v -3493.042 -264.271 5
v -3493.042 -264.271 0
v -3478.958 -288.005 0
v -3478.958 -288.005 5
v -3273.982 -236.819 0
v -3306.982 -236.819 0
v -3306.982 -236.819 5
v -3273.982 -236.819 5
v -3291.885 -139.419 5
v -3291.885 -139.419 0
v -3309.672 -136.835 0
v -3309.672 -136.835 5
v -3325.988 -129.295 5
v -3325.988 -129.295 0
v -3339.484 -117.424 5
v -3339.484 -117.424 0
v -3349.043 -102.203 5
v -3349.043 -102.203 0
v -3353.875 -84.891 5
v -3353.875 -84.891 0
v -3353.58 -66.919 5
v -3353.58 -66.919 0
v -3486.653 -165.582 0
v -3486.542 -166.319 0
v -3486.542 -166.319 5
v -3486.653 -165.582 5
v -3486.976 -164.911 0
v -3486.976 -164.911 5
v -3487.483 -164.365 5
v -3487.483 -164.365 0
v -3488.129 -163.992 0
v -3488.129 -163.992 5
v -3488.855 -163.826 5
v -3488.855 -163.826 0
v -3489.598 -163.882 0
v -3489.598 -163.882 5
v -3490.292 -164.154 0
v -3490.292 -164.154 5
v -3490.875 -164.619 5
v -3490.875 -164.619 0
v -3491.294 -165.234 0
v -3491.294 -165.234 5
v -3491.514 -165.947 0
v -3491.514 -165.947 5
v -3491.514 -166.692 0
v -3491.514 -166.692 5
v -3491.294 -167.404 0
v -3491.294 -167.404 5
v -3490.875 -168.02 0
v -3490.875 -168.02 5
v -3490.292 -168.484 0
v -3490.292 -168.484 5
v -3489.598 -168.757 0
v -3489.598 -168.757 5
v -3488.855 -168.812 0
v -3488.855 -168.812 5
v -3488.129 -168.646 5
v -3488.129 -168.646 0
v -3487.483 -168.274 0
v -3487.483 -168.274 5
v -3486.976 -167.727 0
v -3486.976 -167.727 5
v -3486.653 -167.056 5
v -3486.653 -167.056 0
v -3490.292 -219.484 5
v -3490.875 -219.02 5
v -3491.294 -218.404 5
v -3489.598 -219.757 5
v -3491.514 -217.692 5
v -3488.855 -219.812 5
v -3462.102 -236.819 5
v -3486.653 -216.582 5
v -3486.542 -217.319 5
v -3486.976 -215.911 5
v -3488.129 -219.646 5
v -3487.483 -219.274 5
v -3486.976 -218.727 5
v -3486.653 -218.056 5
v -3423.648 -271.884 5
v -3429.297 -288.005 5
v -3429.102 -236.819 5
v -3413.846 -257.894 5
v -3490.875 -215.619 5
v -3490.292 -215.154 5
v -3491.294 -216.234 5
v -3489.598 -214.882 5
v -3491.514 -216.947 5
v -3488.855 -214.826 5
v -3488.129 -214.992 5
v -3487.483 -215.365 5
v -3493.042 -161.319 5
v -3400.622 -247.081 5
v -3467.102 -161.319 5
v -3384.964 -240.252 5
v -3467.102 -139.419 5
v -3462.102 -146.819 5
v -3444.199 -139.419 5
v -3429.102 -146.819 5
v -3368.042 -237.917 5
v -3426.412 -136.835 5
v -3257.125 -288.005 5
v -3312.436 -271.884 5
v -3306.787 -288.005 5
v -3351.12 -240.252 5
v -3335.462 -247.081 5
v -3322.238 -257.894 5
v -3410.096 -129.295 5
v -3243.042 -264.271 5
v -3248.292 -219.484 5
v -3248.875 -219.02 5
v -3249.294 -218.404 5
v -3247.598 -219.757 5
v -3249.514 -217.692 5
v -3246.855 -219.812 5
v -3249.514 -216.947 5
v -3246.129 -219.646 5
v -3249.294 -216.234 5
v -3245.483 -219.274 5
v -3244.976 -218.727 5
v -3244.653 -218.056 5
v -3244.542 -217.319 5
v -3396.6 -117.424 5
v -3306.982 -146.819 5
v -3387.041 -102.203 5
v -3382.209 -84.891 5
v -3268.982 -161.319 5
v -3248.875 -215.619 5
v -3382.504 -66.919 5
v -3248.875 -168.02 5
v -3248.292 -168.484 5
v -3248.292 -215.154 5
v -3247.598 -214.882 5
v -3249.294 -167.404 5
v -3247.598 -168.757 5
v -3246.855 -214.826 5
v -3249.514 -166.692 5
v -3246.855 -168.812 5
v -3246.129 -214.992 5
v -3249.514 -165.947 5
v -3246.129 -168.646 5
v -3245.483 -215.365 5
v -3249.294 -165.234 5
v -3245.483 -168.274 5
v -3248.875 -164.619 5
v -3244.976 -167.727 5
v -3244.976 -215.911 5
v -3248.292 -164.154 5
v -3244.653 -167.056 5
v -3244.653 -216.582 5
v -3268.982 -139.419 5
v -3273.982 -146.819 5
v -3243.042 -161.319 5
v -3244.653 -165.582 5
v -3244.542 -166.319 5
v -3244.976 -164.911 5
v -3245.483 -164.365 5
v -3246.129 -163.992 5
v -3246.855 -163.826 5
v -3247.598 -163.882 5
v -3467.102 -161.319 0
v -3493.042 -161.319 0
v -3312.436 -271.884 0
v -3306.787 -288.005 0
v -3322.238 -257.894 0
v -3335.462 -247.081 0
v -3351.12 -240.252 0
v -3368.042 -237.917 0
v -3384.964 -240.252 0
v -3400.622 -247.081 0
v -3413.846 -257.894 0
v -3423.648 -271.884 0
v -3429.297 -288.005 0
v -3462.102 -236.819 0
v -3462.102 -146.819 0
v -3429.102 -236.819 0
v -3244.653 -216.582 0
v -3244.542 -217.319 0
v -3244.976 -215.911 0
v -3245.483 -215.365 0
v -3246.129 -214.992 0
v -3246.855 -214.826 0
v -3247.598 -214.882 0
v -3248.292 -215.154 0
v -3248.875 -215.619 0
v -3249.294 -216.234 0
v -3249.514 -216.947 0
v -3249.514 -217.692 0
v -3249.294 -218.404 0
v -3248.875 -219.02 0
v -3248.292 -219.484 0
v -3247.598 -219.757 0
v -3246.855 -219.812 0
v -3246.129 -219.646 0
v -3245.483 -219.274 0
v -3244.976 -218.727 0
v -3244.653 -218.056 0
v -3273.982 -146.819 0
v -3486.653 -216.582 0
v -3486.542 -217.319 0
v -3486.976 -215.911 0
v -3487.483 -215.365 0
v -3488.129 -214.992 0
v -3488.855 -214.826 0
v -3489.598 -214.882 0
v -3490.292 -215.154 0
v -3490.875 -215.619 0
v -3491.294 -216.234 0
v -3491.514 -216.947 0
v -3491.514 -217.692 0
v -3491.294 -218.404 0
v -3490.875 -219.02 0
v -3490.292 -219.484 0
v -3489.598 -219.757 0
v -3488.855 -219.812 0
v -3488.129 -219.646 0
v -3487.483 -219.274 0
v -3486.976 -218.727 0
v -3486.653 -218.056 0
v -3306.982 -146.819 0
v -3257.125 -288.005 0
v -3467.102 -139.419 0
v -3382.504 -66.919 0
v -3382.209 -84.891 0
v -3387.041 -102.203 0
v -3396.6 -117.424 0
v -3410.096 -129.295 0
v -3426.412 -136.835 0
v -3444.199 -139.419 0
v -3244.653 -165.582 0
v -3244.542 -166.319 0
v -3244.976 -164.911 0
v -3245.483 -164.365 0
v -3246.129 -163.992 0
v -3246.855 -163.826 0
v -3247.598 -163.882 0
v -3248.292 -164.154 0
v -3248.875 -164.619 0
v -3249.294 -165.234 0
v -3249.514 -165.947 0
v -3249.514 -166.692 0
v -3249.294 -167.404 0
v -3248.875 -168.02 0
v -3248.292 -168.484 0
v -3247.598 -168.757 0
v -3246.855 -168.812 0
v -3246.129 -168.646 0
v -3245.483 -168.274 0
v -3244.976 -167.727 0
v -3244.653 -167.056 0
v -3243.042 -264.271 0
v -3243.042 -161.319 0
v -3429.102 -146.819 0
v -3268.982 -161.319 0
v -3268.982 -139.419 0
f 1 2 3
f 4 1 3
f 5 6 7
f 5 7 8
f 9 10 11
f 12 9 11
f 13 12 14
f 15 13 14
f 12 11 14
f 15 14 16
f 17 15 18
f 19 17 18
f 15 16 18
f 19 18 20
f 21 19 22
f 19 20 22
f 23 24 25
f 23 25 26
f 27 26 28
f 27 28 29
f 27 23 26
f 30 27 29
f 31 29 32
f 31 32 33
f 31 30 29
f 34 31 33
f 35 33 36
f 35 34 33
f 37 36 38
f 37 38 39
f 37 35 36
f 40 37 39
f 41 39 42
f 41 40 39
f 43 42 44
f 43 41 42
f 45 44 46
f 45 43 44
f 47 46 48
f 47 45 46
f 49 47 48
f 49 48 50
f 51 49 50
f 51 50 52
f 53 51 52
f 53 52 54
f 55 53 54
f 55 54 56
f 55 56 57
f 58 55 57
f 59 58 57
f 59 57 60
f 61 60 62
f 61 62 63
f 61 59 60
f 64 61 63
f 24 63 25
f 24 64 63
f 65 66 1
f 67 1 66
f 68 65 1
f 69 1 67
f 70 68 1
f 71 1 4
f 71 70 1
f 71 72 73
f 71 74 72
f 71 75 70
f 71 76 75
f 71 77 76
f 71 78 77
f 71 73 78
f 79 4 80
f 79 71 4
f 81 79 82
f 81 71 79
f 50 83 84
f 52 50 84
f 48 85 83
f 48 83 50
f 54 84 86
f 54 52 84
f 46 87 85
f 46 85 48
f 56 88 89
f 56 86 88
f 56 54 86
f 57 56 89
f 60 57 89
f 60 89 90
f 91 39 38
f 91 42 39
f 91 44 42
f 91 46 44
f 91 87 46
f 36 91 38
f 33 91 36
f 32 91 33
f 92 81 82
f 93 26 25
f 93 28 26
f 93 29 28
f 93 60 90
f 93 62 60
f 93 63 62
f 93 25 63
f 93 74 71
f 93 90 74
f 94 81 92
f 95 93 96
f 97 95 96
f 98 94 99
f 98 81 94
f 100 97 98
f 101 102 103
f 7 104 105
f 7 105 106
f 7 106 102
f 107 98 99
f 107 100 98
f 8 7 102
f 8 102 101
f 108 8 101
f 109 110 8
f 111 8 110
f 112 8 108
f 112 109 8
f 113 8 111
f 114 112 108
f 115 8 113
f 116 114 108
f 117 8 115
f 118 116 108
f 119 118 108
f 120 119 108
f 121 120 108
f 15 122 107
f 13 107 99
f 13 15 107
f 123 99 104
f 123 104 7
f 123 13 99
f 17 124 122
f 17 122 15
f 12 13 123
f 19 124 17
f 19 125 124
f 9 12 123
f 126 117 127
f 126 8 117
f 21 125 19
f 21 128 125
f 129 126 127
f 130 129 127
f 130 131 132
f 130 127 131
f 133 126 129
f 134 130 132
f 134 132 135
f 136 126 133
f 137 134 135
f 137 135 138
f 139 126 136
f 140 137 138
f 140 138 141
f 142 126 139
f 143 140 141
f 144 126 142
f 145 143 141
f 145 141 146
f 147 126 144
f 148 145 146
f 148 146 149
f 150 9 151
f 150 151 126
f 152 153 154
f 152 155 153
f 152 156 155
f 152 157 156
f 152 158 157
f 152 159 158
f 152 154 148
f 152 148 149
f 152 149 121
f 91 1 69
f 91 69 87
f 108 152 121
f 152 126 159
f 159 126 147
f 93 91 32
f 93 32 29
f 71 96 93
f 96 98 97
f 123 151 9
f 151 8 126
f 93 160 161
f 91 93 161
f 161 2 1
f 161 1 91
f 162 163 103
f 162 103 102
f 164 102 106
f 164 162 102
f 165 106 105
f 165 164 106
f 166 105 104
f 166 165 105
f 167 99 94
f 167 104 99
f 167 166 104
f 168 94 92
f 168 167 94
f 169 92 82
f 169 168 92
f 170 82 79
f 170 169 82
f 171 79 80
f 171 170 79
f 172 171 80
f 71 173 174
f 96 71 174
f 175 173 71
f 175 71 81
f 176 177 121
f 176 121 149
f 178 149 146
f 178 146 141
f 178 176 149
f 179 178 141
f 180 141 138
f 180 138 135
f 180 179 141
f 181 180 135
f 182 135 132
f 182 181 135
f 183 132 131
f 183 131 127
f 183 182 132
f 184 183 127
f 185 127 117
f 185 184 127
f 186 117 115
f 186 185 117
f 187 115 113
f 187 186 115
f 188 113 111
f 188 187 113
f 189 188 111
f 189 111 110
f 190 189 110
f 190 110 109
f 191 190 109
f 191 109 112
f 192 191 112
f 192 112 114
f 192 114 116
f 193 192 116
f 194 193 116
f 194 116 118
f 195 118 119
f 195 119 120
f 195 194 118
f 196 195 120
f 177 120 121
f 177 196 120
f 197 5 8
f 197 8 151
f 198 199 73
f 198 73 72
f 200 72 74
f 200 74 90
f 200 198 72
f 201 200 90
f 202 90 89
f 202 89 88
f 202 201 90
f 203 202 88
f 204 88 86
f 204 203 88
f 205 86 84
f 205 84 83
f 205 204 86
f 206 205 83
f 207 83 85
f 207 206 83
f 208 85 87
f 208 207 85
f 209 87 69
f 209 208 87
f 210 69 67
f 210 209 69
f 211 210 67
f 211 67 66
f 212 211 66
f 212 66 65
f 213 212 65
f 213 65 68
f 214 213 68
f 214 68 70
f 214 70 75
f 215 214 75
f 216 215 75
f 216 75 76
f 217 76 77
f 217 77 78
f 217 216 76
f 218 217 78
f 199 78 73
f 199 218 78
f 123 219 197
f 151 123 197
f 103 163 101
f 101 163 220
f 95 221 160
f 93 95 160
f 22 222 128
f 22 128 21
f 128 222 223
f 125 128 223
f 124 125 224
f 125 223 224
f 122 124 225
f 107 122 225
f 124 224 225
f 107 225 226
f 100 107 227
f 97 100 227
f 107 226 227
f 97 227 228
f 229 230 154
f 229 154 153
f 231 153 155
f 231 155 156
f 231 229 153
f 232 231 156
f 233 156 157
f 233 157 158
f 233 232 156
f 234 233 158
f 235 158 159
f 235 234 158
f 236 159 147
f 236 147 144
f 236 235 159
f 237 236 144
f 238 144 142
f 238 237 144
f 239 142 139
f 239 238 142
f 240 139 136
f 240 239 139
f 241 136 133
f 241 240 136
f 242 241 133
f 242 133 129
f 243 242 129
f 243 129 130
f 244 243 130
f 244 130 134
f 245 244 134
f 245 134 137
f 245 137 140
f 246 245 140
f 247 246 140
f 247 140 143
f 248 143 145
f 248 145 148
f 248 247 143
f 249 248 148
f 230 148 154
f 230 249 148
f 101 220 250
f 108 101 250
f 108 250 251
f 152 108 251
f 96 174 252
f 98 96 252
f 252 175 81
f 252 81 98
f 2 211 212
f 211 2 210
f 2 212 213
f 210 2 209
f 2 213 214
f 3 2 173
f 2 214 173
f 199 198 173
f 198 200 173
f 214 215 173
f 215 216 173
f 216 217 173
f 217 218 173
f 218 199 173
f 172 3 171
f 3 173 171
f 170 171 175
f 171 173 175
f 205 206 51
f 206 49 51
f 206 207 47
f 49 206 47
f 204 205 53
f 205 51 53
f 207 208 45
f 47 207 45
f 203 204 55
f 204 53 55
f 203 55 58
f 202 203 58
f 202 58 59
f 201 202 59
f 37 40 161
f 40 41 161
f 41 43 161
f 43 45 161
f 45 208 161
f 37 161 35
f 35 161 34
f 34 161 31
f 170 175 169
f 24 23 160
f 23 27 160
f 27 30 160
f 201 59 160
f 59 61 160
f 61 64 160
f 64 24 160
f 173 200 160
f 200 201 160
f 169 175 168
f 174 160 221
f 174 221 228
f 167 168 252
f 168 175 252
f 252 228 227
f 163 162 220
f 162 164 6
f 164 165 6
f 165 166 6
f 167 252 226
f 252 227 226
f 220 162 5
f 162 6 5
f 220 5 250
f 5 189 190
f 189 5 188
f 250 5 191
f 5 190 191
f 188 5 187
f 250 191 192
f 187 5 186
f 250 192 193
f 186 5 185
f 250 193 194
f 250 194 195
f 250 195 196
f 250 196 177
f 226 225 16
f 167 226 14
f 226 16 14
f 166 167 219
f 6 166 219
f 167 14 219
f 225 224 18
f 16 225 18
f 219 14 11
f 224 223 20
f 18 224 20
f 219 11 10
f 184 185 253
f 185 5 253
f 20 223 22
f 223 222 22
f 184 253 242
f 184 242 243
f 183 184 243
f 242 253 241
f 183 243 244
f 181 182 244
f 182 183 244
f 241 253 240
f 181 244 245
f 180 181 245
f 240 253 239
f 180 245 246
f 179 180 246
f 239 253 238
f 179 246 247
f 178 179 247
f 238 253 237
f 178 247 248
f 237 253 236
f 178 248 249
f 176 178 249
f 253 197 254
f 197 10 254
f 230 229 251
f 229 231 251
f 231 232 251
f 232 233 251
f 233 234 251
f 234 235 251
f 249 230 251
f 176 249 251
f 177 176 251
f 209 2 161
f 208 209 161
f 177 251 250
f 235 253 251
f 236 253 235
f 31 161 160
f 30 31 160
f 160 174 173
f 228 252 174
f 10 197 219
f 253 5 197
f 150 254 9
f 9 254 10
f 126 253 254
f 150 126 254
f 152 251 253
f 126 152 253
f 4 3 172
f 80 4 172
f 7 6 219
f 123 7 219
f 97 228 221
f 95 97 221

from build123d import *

# Parameters (mm, degrees)
SKETCH1_W           = 250
SKETCH1_H           = 221.085663757
SKETCH1_R           = 2.5
SKETCH1_W_2         = 33
SKETCH1_H_2         = 90
BOSS_EXTRUDE1_DEPTH = 5
SKETCH6_R           = 62.5
CUT_EXTRUDE4_DEPTH  = 6


with BuildPart() as part:
    # Sketch1 → Boss-Extrude1 (new body)
    with BuildSketch(Plane.XY):
        with Locations((-3368.041949546, -177.462013972)):
            Rectangle(SKETCH1_W, SKETCH1_H)
        with Locations((-3489.041949546, -217.319182093)):
            Circle(SKETCH1_R, mode=Mode.SUBTRACT)
        with Locations((-3489.041949546, -166.319182093)):
            Circle(SKETCH1_R, mode=Mode.SUBTRACT)
        with Locations((-3247.041949546, -166.319182093)):
            Circle(SKETCH1_R, mode=Mode.SUBTRACT)
        with Locations((-3247.041949546, -217.319182093)):
            Circle(SKETCH1_R, mode=Mode.SUBTRACT)
        with Locations((-3445.601949546, -191.819182093)):
            Rectangle(SKETCH1_W_2, SKETCH1_H_2, mode=Mode.SUBTRACT)
        with Locations((-3290.481949546, -191.819182093)):
            Rectangle(SKETCH1_W_2, SKETCH1_H_2, mode=Mode.SUBTRACT)
    extrude(amount=BOSS_EXTRUDE1_DEPTH)

    # Sketch6 → Cut-Extrude4 (cut, through all)
    with BuildSketch(Plane.XY):
        with Locations((-3368.041949546, -300.417289182)):
            Circle(SKETCH6_R)
        Polygon((-3503.457885375, -270.451546314), (-3493.041949546, -264.270843991), (-3478.958452604, -288.00484585), (-3489.374388434, -294.185548172), align=None)
        with BuildLine():
            Line((-3493.041949546, -161.319182093), (-3493.041949546, -66.919182093))
            Line((-3493.041949546, -66.919182093), (-3382.503777097, -66.919182093))
            ThreePointArc((-3382.503777097, -66.919182093), (-3396.600008581, -117.423811459), (-3444.198590493, -139.419182093))
            Line((-3444.198590493, -139.419182093), (-3467.101949546, -139.419182093))
            Line((-3467.101949546, -139.419182093), (-3467.101949546, -161.319182093))
            Line((-3467.101949546, -161.319182093), (-3493.041949546, -161.319182093))
        make_face()
        Polygon((-3246.709510658, -294.185548172), (-3257.125446487, -288.00484585), (-3243.041949546, -264.270843991), (-3232.626013716, -270.451546314), align=None)
        with BuildLine():
            Line((-3268.981949546, -139.419182093), (-3291.885308598, -139.419182093))
            ThreePointArc((-3291.885308598, -139.419182093), (-3339.48389051, -117.423811459), (-3353.580121995, -66.919182093))
            Line((-3353.580121995, -66.919182093), (-3243.041949546, -66.919182093))
            Line((-3243.041949546, -66.919182093), (-3243.041949546, -161.319182093))
            Line((-3243.041949546, -161.319182093), (-3268.981949546, -161.319182093))
            Line((-3268.981949546, -161.319182093), (-3268.981949546, -139.419182093))
        make_face()
    extrude(amount=CUT_EXTRUDE4_DEPTH, mode=Mode.SUBTRACT)


solid = part.part
